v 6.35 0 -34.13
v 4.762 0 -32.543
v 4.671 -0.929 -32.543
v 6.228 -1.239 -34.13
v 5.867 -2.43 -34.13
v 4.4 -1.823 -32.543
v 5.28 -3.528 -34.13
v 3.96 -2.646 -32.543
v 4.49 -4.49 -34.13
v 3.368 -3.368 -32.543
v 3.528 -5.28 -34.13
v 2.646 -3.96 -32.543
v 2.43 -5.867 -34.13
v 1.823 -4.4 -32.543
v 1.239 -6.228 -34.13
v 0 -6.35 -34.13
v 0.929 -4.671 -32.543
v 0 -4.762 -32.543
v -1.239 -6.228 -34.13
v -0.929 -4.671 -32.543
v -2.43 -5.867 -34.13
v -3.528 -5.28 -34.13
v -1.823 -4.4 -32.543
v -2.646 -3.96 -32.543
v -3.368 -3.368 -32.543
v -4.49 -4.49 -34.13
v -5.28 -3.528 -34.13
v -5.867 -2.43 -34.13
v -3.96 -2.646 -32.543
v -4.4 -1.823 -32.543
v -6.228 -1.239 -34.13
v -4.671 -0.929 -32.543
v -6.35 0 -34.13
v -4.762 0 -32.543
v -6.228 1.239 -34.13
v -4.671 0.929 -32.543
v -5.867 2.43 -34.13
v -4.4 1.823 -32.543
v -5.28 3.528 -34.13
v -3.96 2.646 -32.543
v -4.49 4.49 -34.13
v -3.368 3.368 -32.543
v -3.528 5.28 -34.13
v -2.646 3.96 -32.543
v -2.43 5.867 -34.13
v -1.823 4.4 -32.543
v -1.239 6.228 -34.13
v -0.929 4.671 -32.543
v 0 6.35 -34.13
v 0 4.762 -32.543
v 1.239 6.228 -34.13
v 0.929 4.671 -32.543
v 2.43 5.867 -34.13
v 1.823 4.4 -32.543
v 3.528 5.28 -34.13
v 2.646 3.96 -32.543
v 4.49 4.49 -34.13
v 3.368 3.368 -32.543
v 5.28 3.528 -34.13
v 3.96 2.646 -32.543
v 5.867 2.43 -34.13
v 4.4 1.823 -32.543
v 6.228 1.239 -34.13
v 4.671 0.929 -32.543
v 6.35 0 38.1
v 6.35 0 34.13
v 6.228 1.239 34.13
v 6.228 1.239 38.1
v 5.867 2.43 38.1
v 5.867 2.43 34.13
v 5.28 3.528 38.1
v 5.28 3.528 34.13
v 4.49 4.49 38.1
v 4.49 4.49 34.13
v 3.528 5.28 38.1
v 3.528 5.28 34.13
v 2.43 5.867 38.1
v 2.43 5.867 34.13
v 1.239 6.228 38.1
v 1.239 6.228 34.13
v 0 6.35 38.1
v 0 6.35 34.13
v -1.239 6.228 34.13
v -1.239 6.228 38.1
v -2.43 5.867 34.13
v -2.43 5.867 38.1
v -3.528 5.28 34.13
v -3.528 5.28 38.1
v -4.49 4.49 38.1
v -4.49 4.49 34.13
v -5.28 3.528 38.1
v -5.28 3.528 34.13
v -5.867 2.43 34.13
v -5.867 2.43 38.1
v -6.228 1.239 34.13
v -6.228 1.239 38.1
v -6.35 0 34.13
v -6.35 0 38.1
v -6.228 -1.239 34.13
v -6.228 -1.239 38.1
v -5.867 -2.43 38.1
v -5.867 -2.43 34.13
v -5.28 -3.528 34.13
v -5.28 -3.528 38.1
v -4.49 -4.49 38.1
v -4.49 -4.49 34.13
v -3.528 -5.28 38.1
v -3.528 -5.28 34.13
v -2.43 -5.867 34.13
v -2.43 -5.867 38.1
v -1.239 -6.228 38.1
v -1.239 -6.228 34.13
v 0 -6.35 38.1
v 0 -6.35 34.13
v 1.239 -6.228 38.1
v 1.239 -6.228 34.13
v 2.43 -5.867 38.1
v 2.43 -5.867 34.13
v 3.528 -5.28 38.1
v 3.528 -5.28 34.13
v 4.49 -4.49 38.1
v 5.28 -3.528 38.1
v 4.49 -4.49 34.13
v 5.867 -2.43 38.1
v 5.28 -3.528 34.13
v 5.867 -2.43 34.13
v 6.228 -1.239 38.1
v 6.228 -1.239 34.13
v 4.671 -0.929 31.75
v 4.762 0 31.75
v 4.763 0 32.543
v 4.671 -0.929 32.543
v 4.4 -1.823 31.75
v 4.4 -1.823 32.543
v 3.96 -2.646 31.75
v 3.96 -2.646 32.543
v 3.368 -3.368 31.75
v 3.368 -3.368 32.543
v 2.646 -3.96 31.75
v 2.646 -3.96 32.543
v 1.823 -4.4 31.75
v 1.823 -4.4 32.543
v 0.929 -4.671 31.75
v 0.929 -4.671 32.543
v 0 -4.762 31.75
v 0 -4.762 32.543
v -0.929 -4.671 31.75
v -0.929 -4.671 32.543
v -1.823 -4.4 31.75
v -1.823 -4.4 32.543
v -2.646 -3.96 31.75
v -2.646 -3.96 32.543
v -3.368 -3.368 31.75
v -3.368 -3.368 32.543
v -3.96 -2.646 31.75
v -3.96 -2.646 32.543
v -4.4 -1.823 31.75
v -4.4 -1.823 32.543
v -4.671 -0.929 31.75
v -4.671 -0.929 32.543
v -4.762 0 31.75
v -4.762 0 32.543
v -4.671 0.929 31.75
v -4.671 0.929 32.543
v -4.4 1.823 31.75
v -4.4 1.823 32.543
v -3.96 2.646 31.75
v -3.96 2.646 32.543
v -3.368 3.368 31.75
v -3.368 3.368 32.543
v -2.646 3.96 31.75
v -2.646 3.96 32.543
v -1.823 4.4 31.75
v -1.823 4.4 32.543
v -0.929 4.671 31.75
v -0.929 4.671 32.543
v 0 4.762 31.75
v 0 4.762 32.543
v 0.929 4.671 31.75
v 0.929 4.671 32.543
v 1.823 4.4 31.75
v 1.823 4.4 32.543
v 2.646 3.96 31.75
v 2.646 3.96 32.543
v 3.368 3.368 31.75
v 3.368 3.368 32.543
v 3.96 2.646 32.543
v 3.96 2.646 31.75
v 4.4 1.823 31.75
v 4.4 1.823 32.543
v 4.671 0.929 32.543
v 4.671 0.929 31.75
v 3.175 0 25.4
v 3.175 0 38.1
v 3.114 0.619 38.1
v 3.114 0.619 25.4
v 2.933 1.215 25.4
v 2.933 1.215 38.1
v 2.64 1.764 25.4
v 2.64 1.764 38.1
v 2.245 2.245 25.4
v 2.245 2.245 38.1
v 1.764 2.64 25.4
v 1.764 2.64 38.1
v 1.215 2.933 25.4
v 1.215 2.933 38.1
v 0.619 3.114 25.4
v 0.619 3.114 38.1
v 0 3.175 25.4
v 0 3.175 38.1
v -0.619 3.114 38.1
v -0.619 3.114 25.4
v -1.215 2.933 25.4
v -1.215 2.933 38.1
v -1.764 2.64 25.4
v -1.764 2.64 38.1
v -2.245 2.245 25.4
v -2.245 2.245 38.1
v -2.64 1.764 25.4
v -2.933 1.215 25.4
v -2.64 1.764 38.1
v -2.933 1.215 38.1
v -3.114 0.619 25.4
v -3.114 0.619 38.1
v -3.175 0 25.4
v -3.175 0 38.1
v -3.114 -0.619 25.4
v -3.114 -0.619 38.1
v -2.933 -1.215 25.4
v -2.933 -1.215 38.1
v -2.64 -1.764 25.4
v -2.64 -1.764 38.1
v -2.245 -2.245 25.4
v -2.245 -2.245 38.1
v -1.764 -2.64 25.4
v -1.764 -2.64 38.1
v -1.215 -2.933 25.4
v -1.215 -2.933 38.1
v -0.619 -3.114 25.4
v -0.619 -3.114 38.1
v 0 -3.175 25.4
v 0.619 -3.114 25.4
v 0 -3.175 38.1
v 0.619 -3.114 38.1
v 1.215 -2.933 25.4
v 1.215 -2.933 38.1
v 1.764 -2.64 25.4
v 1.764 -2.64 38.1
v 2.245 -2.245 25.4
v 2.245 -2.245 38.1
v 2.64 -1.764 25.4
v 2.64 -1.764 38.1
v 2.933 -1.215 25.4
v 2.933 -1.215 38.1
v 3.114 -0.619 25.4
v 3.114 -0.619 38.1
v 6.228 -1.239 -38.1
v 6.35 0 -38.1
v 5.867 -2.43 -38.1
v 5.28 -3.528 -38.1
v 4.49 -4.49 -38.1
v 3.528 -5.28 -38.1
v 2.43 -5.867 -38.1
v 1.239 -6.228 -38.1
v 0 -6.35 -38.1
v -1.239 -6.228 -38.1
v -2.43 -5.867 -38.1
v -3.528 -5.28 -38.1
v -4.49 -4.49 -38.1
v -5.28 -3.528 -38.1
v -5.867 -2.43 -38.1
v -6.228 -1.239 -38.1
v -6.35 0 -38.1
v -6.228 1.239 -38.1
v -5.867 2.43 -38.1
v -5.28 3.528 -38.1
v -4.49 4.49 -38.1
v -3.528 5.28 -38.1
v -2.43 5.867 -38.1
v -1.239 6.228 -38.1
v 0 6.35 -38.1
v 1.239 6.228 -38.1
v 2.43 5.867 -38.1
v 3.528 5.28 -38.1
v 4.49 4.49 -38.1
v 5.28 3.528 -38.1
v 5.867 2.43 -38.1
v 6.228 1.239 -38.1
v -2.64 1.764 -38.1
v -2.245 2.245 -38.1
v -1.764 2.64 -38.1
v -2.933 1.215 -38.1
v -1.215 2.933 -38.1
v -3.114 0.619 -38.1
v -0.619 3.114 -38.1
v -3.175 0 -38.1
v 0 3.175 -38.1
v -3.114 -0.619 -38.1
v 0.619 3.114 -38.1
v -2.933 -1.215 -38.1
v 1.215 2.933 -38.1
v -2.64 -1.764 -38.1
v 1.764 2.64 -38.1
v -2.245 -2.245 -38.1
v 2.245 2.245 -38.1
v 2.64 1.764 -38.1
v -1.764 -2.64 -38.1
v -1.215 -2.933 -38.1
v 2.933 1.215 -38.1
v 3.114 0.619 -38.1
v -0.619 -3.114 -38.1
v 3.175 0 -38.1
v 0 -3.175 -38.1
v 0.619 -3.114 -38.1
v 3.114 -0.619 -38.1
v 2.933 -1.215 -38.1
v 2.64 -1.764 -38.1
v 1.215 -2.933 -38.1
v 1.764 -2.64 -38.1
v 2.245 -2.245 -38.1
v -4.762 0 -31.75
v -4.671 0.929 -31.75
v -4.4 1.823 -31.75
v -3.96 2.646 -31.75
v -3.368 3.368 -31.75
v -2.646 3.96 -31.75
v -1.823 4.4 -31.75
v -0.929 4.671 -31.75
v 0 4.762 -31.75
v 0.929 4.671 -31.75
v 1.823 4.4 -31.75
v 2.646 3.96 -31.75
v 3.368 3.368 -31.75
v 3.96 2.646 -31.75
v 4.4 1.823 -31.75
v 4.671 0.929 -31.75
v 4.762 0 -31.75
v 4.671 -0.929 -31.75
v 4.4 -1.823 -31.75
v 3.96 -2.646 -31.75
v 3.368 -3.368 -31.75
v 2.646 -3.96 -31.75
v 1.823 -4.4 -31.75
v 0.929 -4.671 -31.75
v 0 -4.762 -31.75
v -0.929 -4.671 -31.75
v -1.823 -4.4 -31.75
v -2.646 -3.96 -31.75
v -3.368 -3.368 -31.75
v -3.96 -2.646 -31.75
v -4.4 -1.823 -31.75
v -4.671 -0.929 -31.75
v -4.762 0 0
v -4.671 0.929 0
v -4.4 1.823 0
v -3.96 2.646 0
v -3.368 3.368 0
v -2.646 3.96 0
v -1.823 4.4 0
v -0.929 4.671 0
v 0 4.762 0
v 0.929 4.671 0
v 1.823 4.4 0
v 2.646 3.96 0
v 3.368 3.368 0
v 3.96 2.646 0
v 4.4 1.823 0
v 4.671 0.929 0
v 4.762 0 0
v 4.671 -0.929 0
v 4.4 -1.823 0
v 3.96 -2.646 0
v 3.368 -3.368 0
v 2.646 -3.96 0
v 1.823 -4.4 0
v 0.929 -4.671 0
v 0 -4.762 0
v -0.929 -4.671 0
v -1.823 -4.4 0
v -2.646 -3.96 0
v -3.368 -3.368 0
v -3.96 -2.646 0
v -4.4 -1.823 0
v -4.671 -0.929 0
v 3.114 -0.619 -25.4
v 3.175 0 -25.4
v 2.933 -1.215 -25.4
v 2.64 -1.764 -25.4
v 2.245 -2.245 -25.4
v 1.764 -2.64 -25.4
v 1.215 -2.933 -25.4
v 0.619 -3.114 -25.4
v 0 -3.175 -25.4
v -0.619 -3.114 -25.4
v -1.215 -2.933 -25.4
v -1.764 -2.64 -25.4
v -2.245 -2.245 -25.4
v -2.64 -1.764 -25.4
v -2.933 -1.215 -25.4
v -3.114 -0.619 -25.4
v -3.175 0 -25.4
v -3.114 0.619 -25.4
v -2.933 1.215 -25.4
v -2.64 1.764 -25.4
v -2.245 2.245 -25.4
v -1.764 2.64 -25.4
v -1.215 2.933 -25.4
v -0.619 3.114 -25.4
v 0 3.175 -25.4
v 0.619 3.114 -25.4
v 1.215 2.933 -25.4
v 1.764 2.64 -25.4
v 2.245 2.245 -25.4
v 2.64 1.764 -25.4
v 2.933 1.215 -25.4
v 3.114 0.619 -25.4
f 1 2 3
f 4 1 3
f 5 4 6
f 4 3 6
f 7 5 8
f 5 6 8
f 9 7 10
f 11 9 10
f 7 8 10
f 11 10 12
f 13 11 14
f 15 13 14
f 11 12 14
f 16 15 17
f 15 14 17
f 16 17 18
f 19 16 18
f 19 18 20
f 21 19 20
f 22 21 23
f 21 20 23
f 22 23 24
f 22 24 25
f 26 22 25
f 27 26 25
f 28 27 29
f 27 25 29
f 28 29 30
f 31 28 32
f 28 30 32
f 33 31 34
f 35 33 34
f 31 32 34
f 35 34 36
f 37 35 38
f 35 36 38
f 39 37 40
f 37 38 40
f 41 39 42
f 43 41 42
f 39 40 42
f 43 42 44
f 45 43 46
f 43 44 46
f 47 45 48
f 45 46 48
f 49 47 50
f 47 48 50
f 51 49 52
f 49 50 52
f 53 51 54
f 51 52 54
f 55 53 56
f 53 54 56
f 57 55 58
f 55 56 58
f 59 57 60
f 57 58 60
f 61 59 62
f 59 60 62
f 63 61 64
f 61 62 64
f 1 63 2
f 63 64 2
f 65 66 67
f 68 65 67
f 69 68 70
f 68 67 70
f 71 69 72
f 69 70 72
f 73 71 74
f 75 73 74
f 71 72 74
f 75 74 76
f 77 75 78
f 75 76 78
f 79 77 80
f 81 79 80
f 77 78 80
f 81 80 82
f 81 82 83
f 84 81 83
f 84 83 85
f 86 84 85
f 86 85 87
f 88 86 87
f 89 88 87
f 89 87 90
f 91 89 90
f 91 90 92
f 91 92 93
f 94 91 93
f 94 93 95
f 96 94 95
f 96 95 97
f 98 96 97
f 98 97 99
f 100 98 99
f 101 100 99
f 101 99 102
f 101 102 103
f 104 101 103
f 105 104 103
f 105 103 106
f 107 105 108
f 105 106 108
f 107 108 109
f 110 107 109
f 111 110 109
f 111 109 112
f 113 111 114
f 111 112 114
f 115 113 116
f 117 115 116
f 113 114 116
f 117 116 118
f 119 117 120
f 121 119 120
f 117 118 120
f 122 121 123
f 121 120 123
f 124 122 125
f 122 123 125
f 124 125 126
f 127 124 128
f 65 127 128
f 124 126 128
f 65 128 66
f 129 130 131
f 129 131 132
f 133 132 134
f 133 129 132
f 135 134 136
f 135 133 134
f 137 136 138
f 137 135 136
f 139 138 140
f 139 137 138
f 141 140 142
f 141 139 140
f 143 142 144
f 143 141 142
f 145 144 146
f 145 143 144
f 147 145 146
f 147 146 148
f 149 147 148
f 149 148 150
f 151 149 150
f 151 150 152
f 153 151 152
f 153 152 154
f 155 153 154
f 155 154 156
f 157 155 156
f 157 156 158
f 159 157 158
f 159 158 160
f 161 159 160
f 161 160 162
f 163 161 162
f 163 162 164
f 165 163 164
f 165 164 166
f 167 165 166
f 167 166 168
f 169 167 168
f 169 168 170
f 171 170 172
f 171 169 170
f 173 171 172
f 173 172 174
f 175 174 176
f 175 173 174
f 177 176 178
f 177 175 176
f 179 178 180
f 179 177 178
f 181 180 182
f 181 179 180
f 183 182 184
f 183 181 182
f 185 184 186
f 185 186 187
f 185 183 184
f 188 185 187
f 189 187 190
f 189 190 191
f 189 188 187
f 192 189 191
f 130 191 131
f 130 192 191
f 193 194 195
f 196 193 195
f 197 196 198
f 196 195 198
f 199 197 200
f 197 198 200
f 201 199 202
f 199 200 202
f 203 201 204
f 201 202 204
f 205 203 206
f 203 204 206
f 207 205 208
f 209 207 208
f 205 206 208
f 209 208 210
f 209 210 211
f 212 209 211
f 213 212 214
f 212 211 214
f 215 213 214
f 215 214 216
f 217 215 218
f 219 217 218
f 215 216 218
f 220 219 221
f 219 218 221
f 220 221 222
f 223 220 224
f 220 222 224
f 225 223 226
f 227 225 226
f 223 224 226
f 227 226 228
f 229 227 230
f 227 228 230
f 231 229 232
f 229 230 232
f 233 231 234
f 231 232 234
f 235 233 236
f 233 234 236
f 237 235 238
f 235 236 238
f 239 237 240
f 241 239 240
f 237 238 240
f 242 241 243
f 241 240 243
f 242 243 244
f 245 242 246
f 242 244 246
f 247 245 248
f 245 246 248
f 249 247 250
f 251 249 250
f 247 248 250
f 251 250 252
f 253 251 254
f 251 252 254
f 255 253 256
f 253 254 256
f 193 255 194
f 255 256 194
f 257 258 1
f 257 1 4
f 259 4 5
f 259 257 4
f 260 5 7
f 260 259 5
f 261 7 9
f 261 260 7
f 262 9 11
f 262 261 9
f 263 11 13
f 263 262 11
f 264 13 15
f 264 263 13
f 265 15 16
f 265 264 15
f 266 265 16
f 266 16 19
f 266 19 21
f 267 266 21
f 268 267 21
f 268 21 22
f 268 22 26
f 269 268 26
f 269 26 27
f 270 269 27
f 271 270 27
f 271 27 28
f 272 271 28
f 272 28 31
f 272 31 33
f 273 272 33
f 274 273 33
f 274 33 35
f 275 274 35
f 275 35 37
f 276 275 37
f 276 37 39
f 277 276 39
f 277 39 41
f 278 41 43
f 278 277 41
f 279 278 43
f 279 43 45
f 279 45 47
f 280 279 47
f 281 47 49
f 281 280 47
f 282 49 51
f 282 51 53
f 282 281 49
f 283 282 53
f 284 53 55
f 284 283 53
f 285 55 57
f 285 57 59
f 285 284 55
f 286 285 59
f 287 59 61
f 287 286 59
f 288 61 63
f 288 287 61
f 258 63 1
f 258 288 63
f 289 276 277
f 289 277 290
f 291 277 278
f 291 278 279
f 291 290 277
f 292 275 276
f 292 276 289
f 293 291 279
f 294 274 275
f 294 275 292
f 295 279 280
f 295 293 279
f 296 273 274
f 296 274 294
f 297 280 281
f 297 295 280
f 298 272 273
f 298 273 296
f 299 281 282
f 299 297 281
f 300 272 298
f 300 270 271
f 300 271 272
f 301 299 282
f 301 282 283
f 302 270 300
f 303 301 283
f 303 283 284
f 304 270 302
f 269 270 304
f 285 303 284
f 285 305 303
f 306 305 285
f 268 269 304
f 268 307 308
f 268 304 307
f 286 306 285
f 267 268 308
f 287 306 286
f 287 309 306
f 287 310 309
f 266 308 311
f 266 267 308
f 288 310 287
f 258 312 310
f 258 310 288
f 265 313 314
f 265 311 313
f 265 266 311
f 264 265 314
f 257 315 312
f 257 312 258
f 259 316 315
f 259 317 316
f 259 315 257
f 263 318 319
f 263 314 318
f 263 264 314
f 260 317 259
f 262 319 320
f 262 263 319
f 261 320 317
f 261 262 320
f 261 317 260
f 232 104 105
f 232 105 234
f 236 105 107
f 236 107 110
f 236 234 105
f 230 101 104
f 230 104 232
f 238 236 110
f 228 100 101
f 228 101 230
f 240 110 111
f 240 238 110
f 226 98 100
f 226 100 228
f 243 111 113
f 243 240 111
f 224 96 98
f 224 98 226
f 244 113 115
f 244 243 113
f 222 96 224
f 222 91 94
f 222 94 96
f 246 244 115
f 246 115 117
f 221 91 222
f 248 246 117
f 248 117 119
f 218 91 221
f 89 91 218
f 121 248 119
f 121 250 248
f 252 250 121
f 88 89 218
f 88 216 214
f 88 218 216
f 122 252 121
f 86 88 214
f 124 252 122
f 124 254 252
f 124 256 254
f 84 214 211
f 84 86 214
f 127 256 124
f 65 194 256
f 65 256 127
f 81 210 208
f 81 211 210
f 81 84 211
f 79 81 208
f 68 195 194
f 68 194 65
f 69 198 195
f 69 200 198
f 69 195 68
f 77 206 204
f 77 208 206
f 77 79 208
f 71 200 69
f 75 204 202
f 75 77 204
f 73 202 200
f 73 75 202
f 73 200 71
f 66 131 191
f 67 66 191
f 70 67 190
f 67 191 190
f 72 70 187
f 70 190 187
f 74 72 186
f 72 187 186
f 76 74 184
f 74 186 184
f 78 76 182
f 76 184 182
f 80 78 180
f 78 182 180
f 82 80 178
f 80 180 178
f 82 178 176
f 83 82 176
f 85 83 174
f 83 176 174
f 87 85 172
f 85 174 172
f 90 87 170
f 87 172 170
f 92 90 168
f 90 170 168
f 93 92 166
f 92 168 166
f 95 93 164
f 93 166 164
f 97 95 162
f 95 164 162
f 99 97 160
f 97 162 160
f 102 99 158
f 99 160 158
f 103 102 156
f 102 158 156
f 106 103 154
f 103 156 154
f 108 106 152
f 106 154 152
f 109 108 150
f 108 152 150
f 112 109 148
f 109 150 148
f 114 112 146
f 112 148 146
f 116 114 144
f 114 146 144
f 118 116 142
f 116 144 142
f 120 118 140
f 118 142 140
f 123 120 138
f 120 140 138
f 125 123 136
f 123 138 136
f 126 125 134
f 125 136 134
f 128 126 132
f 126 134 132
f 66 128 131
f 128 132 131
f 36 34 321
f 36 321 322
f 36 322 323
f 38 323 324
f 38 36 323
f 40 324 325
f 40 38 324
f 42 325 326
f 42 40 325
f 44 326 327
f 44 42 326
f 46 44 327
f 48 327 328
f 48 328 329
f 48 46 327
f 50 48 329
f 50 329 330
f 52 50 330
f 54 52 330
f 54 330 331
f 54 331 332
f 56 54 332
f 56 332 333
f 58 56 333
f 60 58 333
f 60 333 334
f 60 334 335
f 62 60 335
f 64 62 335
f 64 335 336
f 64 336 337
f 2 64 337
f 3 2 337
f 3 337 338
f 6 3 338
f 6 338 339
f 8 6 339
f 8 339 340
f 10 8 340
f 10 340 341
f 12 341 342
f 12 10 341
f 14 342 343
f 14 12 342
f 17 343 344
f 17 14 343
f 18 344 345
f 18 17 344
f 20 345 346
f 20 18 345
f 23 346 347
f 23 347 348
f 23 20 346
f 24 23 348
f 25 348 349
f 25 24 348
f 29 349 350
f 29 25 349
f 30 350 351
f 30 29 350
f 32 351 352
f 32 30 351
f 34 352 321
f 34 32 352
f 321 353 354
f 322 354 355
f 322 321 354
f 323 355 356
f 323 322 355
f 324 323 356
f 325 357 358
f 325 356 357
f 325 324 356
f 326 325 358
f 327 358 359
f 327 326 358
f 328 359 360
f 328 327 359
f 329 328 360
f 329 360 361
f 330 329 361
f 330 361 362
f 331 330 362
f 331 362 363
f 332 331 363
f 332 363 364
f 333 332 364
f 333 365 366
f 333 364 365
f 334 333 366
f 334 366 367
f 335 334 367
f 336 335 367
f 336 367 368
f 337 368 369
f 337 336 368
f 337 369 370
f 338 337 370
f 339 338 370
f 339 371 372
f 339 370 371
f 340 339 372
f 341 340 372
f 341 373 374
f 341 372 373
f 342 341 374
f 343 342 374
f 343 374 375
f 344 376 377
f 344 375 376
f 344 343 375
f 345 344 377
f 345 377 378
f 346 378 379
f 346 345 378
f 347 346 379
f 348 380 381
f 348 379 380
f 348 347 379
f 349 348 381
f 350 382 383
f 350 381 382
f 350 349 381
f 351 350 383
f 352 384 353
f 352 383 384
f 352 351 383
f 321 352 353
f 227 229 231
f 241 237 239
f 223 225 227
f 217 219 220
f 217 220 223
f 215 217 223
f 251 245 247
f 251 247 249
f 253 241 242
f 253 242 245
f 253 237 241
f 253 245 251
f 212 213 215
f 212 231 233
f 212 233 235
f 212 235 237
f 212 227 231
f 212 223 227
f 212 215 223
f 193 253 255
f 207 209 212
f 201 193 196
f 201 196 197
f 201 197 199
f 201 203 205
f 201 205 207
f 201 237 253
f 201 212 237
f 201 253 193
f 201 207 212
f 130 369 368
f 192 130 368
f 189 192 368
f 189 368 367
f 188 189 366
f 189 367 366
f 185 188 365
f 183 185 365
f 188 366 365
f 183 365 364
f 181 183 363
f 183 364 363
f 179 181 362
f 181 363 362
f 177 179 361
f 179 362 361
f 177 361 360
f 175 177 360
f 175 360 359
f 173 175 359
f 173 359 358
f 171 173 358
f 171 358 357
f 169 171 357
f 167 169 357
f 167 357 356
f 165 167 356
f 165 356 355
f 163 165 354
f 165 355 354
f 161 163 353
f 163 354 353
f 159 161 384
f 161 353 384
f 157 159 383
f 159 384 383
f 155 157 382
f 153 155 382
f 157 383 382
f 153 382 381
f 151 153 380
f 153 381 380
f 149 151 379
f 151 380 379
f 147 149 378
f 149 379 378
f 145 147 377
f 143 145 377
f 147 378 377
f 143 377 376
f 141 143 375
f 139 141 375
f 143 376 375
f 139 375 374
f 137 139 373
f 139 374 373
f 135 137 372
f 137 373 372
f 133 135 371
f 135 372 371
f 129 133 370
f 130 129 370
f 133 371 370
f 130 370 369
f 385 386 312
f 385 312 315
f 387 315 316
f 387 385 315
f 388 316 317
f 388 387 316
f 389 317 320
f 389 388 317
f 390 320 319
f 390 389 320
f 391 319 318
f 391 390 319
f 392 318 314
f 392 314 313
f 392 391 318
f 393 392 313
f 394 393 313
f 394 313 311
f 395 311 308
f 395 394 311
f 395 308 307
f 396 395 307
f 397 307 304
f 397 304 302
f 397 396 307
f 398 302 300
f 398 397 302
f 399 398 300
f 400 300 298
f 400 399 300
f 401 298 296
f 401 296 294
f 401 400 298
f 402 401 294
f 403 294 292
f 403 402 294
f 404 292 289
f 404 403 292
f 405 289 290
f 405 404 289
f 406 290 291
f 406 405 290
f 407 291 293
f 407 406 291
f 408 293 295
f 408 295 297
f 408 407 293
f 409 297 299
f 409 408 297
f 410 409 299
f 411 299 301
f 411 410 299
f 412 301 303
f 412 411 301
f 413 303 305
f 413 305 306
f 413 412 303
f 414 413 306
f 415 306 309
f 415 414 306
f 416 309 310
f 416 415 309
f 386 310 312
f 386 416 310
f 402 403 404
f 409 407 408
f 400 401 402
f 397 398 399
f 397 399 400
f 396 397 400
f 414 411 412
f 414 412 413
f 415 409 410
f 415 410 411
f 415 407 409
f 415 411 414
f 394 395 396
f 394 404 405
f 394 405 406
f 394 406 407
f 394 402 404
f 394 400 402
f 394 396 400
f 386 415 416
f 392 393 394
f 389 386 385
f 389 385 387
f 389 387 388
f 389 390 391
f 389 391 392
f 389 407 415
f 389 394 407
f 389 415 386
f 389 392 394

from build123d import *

# Parameters (mm, degrees)
SKETCH1_R           = 4.7625
BOSS_EXTRUDE1_DEPTH = 31.75
SKETCH2_R           = 6.35
BOSS_EXTRUDE2_DEPTH = 6.35
CHAMFER1_SIZE       = 2.38
SKETCH3_R           = 3.175
CUT_EXTRUDE1_DEPTH  = 12.7
BOSS_EXTRUDE3_START = 31.75
SKETCH4_R           = 4.7625
BOSS_EXTRUDE3_DEPTH = 31.75
BOSS_EXTRUDE4_START = 6.35
SKETCH5_R           = 6.35
BOSS_EXTRUDE4_DEPTH = 6.35
CHAMFER2_SIZE       = 2.38
CUT_EXTRUDE2_START  = -12.7
SKETCH6_R           = 3.175
CUT_EXTRUDE2_DEPTH  = 12.7


with BuildPart() as part:
    # Sketch1 → Boss-Extrude1 (new body)
    with BuildSketch(Plane.XY):
        Circle(SKETCH1_R)
    extrude(amount=BOSS_EXTRUDE1_DEPTH)

    # Sketch2 → Boss-Extrude2 (add)
    with BuildSketch(Plane.XY.offset(31.75)):
        Circle(SKETCH2_R)
    extrude(amount=BOSS_EXTRUDE2_DEPTH)

    # Chamfer1
    # the kernel refuses this chamfer: 2.38 mm, written as the material it takes off along each edge
    with BuildSketch(Plane(origin=(0, 0, 31.75), x_dir=(1, 0, 0), z_dir=(0, -1, 0))) as chamfer1_piece_1_section:
        Polygon((6.35, CHAMFER1_SIZE), (6.35 - CHAMFER1_SIZE, 0), (6.35, 0), align=None)
    chamfer1_piece_1 = revolve(axis=Axis((0, 0, 31.75), (0, 0, 1)), mode=Mode.PRIVATE)
    chamfer1_piece_1 = chamfer1_piece_1 - Plane(origin=(0, 0, 33.337286279), x_dir=(1, 0, 0), z_dir=(0, 0, -1)) * Cylinder(4.7625, 26, mode=Mode.PRIVATE)
    add(chamfer1_piece_1, mode=Mode.SUBTRACT)

    # Sketch3 → Cut-Extrude1 (cut)
    with BuildSketch(Plane.XY.offset(38.1)):
        Circle(SKETCH3_R)
    extrude(amount=-CUT_EXTRUDE1_DEPTH, mode=Mode.SUBTRACT)

    # Sketch4 → Boss-Extrude3 (add)
    with BuildSketch(Plane(origin=(0, 0, 0), x_dir=(-1, 0, 0), z_dir=(0, 0, -1)).offset(BOSS_EXTRUDE3_START)):
        Circle(SKETCH4_R)
    extrude(amount=-BOSS_EXTRUDE3_DEPTH)

    # Sketch5 → Boss-Extrude4 (add)
    with BuildSketch(Plane(origin=(0, 0, -31.75), x_dir=(-1, 0, 0), z_dir=(0, 0, -1)).offset(BOSS_EXTRUDE4_START)):
        with Locations(Location((0, 0, 0), (0, 0, 180))):
            Circle(SKETCH5_R)
    extrude(amount=-BOSS_EXTRUDE4_DEPTH)

    # Chamfer2
    # the kernel refuses this chamfer: 2.38 mm, written as the material it takes off along each edge
    with BuildSketch(Plane(origin=(0, 0, -31.75), x_dir=(1, 0, 0), z_dir=(0, 1, 0))) as chamfer2_piece_1_section:
        Polygon((6.35, CHAMFER2_SIZE), (6.35 - CHAMFER2_SIZE, 0), (6.35, 0), align=None)
    chamfer2_piece_1 = revolve(axis=Axis((0, 0, -31.75), (0, 0, -1)), mode=Mode.PRIVATE)
    chamfer2_piece_1 = chamfer2_piece_1 - Plane(origin=(0, 0, -33.337286279), x_dir=(-1, 0, 0), z_dir=(0, 0, -1)) * Cylinder(4.7625, 26, mode=Mode.PRIVATE)
    add(chamfer2_piece_1, mode=Mode.SUBTRACT)

    # Sketch6 → Cut-Extrude2 (cut)
    with BuildSketch(Plane(origin=(0, 0, -38.1), x_dir=(-1, 0, 0), z_dir=(0, 0, -1)).offset(CUT_EXTRUDE2_START)):
        with Locations(Location((0, 0, 0), (0, 0, 180))):
            Circle(SKETCH6_R)
    extrude(amount=CUT_EXTRUDE2_DEPTH, mode=Mode.SUBTRACT)


solid = part.part
